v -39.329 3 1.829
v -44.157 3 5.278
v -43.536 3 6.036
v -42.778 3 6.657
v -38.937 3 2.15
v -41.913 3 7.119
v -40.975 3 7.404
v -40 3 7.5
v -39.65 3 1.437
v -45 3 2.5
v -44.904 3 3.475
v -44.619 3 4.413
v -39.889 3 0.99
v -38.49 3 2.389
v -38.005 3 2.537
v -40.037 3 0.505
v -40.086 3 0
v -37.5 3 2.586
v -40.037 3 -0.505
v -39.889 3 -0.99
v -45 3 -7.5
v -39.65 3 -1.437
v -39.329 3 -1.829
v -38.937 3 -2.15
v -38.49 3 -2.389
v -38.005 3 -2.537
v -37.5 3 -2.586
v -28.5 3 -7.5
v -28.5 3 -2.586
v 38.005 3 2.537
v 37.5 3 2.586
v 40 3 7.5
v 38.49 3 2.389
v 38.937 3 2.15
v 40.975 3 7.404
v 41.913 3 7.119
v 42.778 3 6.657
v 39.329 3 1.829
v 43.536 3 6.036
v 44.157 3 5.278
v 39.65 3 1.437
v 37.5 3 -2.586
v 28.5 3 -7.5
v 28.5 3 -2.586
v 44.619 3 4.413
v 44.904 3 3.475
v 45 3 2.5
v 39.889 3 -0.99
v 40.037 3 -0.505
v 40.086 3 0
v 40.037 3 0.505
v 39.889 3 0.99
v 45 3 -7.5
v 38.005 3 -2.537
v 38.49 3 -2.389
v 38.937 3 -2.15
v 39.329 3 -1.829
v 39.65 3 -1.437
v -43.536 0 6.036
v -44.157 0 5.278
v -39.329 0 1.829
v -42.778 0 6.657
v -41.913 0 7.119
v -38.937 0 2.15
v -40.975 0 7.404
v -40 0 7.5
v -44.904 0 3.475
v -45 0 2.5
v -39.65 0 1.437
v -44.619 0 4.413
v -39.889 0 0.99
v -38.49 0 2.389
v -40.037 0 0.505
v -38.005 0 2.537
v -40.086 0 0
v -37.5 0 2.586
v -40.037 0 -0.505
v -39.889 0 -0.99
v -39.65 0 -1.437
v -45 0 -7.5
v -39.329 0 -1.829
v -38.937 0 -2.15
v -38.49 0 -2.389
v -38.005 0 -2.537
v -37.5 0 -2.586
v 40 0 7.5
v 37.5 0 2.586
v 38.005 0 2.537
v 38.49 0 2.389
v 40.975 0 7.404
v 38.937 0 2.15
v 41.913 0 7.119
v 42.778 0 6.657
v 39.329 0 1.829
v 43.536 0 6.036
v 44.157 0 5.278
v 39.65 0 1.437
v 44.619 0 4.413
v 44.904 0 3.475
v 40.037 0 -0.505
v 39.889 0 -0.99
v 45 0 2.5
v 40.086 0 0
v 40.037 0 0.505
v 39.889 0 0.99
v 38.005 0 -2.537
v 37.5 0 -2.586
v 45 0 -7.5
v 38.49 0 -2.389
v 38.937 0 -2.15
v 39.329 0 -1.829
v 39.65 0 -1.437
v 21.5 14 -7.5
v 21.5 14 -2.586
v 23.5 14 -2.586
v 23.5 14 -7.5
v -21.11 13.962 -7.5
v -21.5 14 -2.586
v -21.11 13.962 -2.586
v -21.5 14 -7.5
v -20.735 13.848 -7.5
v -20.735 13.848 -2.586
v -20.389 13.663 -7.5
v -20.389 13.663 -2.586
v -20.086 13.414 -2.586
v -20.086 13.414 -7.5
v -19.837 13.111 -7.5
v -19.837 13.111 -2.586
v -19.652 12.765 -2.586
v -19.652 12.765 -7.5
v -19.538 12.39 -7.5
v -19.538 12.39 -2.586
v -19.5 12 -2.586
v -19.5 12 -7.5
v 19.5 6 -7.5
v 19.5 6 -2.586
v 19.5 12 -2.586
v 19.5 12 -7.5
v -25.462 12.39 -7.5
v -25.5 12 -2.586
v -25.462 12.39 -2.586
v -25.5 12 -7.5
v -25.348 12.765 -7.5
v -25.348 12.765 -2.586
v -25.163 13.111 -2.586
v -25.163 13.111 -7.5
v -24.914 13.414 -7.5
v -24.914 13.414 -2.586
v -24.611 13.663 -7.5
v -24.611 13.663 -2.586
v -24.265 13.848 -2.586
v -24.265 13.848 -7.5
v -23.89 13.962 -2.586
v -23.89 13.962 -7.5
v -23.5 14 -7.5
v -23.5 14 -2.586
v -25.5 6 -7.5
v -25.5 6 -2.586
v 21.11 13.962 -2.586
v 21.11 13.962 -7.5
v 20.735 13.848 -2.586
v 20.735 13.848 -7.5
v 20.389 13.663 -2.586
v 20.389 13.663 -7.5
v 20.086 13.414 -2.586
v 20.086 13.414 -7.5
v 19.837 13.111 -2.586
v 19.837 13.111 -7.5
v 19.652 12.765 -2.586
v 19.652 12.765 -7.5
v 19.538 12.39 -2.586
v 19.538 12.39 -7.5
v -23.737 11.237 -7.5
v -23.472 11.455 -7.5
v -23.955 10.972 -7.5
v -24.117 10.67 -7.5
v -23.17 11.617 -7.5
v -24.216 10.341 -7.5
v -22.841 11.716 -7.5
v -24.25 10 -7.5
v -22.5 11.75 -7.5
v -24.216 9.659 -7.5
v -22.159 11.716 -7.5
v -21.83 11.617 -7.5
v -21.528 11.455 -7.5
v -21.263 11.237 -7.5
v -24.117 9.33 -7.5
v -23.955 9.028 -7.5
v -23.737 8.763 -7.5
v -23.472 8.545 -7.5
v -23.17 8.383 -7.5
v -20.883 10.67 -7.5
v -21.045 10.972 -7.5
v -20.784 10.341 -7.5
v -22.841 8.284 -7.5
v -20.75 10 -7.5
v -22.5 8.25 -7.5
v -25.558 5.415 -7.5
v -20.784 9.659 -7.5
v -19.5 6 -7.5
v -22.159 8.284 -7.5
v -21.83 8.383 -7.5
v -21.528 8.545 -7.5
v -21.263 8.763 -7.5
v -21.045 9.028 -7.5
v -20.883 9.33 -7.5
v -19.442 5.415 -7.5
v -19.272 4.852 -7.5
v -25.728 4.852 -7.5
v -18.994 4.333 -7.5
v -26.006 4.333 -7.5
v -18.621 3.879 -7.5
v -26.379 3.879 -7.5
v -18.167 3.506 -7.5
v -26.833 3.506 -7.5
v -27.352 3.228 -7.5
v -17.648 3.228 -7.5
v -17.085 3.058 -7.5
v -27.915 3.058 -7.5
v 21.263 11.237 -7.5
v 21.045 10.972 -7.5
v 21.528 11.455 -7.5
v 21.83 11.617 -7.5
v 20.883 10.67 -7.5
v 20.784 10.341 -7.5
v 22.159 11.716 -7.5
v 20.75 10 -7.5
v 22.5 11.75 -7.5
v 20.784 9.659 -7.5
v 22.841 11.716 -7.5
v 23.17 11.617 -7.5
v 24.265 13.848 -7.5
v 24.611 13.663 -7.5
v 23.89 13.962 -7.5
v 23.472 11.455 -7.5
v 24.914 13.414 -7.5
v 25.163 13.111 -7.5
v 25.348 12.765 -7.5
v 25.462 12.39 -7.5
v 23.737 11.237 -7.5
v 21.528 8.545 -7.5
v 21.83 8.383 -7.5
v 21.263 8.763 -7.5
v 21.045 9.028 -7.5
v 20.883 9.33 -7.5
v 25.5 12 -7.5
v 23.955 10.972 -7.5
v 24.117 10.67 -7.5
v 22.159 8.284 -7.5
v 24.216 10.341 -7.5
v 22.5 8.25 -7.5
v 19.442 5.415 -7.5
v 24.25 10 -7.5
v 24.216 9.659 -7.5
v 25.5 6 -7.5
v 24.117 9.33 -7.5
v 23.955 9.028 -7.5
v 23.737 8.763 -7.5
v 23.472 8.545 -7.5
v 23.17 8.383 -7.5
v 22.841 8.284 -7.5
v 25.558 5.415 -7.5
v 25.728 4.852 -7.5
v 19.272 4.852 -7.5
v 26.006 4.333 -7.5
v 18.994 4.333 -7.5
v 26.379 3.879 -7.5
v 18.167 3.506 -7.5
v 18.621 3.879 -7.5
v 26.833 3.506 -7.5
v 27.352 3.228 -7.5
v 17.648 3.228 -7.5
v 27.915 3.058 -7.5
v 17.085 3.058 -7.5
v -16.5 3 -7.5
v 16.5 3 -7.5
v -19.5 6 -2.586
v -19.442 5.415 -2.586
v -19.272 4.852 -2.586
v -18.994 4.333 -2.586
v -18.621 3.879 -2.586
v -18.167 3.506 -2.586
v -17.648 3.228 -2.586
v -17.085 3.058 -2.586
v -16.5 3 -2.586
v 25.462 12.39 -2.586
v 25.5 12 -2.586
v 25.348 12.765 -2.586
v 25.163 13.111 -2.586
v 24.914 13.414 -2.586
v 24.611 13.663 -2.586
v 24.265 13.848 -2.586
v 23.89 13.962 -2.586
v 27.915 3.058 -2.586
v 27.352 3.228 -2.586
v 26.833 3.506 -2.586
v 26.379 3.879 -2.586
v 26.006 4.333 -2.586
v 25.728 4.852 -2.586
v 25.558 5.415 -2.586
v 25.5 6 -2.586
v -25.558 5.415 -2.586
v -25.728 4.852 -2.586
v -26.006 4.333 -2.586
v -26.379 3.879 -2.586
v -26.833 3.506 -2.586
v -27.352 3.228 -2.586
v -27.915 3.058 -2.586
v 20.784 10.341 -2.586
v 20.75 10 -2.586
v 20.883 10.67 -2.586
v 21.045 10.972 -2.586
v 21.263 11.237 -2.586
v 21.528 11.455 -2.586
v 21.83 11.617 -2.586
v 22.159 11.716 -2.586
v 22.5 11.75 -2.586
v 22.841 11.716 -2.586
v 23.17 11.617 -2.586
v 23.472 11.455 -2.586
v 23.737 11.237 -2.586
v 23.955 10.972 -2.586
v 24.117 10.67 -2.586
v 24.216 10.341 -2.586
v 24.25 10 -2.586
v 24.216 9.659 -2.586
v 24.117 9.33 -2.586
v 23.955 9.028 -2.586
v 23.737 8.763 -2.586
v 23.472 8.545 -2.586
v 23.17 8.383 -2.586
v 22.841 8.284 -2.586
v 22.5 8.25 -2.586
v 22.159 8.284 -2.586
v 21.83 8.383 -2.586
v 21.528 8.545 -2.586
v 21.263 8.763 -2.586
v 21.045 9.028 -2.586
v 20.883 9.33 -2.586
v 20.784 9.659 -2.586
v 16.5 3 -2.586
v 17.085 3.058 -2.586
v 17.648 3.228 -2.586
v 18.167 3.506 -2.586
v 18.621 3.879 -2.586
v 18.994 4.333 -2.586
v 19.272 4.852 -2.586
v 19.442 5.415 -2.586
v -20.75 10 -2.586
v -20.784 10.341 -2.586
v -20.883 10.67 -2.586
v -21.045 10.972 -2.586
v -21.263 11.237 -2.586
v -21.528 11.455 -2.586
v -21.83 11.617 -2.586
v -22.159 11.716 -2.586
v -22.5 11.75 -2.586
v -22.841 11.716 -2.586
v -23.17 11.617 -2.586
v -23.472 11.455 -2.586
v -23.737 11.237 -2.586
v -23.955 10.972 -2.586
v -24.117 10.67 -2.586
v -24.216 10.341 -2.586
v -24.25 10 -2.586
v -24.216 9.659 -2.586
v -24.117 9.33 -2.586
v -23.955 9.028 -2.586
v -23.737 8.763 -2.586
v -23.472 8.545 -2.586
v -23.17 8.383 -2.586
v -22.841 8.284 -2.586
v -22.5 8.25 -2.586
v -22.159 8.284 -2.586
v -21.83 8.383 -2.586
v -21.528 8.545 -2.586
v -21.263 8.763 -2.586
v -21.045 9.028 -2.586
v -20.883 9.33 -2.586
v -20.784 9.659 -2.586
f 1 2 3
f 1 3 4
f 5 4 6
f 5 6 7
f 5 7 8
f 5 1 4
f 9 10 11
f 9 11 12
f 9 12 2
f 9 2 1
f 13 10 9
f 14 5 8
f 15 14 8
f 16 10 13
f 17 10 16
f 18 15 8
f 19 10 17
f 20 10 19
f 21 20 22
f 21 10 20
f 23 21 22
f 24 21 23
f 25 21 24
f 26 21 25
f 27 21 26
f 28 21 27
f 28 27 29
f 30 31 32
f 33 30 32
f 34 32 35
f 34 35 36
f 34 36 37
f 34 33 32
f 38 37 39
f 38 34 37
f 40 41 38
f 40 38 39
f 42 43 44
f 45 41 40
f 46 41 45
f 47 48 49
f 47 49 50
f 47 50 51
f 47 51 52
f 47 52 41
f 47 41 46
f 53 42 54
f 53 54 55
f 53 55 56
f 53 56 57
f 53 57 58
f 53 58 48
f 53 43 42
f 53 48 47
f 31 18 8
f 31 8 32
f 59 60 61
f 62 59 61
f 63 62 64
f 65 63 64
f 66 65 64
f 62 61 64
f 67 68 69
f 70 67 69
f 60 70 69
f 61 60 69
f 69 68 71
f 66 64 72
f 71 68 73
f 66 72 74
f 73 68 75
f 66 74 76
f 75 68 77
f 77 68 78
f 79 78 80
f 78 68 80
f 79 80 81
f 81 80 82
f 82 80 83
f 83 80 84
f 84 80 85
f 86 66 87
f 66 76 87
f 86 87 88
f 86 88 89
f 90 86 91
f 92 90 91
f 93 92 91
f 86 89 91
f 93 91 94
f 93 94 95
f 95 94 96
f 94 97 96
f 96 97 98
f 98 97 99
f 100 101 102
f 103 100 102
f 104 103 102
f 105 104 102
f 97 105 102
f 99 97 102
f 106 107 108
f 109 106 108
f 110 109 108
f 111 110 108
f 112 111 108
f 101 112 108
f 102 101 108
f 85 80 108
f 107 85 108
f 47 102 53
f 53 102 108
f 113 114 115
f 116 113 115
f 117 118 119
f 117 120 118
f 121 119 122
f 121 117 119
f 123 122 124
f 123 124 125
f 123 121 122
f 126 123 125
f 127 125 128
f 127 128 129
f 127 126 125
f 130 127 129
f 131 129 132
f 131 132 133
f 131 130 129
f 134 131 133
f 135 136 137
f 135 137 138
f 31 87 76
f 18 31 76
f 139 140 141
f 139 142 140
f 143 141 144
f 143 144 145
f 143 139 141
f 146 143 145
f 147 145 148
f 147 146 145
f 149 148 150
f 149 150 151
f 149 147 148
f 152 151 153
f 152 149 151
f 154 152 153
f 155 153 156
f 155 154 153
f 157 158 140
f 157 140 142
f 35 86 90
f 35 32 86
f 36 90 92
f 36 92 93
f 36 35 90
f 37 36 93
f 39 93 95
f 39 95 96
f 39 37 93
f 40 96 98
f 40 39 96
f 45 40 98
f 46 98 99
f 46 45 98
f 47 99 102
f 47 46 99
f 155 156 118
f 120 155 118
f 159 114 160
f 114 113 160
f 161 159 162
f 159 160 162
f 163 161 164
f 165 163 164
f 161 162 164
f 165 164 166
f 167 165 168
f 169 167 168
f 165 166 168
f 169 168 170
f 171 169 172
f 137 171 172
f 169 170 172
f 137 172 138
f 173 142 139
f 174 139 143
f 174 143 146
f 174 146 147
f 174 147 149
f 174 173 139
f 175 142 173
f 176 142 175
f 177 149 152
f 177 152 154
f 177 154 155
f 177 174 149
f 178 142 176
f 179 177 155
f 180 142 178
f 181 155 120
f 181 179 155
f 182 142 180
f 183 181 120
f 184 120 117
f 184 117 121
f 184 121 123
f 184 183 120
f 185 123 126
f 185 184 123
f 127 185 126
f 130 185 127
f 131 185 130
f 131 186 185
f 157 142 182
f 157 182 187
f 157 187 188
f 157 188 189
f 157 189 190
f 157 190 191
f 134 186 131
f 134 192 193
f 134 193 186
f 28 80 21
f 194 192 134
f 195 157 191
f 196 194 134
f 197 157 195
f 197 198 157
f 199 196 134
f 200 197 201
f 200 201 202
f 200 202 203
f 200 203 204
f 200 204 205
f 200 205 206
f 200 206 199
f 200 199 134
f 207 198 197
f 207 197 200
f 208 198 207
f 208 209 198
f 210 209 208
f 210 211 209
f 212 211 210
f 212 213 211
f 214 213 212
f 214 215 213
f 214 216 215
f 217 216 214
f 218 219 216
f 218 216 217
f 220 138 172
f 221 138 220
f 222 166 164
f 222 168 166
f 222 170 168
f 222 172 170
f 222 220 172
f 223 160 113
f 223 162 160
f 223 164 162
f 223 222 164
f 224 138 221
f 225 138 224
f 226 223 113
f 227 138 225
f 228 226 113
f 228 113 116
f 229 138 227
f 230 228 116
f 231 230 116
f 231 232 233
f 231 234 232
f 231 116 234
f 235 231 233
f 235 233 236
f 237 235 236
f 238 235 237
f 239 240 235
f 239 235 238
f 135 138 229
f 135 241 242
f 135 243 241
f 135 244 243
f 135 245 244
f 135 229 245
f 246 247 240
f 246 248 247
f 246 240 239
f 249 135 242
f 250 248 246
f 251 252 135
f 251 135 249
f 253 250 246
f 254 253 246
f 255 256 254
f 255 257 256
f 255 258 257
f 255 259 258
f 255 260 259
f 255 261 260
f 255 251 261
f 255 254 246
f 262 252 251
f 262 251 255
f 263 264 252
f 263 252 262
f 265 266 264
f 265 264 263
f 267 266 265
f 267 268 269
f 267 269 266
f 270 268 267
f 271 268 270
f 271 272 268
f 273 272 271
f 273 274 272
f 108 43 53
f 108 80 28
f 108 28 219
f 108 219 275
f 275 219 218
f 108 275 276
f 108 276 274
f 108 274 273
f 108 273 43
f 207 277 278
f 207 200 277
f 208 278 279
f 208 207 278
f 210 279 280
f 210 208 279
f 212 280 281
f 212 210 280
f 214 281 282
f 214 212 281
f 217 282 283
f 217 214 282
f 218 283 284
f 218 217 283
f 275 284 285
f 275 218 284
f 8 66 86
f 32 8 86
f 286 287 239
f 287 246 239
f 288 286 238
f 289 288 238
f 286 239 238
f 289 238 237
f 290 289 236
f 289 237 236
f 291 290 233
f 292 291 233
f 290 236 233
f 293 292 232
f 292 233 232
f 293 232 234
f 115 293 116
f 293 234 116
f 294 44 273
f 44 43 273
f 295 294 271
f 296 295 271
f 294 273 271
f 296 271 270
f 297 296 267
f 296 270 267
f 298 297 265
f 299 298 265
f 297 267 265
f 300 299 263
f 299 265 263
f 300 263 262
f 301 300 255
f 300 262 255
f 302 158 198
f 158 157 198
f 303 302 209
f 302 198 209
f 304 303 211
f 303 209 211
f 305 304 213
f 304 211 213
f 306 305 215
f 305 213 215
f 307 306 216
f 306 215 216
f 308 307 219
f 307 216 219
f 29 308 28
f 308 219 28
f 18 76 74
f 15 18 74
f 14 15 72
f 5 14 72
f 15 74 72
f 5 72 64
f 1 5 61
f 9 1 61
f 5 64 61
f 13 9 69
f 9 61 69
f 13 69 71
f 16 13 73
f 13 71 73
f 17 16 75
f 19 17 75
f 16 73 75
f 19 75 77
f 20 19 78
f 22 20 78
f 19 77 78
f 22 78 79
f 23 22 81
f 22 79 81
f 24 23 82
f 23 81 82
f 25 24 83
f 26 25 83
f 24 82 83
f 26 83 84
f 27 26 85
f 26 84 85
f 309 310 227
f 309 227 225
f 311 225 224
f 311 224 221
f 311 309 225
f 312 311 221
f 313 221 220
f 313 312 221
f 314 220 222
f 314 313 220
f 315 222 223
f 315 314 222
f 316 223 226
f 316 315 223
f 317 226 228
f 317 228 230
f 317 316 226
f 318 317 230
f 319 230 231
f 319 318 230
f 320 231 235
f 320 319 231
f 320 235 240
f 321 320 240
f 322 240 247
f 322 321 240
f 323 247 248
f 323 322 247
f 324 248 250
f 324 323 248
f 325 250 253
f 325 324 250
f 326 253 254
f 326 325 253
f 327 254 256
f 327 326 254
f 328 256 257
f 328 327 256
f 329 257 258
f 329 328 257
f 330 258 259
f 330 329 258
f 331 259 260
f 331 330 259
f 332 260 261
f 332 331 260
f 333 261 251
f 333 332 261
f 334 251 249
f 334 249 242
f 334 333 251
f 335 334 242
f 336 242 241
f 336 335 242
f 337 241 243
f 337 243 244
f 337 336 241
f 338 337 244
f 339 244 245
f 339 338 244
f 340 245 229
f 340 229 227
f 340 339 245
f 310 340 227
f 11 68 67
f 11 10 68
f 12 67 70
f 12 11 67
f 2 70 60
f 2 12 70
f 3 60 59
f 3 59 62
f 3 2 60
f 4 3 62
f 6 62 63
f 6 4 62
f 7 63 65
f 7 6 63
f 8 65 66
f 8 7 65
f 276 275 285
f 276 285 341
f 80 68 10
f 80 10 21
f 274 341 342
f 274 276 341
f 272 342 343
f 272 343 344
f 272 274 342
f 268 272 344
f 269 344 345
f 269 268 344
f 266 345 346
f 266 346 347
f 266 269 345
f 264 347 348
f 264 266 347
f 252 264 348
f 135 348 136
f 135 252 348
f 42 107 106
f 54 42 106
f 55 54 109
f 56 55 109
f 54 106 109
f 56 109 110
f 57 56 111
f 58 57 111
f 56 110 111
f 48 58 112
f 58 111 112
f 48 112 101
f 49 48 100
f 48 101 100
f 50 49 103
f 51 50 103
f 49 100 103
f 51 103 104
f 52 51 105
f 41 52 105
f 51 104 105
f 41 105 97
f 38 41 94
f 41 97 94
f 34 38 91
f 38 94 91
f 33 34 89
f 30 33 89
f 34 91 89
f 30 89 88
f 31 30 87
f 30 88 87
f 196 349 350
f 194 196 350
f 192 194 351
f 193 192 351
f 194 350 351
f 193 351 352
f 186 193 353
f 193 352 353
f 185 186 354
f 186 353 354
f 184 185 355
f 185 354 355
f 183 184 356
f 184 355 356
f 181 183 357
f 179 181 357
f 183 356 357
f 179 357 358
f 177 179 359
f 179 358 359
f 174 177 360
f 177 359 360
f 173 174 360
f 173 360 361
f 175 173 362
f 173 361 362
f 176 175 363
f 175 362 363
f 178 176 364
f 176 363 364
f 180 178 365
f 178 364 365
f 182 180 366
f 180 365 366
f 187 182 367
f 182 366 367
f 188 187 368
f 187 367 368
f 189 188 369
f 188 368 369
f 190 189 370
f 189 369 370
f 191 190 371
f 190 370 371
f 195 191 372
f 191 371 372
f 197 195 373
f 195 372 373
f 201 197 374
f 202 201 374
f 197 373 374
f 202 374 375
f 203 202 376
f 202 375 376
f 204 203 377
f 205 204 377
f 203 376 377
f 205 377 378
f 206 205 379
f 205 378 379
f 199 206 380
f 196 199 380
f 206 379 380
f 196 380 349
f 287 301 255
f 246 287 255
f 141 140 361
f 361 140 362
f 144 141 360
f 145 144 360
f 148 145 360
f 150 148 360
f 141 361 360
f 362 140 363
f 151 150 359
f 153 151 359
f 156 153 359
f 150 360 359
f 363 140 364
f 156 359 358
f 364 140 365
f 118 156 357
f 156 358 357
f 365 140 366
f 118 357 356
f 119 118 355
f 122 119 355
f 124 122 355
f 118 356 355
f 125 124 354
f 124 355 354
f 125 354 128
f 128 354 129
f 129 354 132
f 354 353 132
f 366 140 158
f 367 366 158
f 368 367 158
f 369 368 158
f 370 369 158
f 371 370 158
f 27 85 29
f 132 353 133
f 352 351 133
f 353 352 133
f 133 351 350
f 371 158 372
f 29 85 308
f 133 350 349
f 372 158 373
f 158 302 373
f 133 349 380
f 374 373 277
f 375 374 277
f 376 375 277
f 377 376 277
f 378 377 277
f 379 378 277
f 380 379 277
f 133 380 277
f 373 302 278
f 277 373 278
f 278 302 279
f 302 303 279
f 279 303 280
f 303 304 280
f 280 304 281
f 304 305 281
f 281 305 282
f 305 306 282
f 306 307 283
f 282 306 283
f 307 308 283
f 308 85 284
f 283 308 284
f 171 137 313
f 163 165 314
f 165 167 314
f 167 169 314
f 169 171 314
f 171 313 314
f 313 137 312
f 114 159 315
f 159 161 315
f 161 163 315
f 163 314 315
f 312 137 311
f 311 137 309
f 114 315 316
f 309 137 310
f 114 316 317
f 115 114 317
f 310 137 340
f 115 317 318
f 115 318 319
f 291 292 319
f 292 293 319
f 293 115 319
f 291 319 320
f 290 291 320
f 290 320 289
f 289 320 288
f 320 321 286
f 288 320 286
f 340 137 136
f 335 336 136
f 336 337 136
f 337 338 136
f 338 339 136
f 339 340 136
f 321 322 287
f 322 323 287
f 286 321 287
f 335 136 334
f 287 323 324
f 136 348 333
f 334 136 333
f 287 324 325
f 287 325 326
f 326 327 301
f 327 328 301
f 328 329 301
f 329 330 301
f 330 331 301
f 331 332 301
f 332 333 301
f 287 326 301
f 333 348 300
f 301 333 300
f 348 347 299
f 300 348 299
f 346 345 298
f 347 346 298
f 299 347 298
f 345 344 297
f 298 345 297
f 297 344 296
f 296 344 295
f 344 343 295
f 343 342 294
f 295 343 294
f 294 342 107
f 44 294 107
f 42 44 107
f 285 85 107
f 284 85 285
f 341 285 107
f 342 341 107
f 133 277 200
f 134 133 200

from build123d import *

# Parameters (mm, degrees)
SKETCH1_W           = 90
SKETCH1_H           = 15
BOSS_EXTRUDE1_DEPTH = 3
FILLET1_R           = 5
SKETCH2_W           = 6
SKETCH2_H           = 4.913709841
BOSS_EXTRUDE2_DEPTH = 11
SKETCH3_R           = 1.75
CUT_EXTRUDE1_DEPTH  = 4.913709841
FILLET2_R           = 2
FILLET3_R           = 3


with BuildPart() as part:
    # Sketch1 → Boss-Extrude1 (new body)
    with BuildSketch(Plane(origin=(0, 0, 0), x_dir=(1, 0, 0), z_dir=(0, 1, 0))):
        Rectangle(SKETCH1_W, SKETCH1_H)
        with BuildLine():
            Line((-37.5, 2.586290159), (37.5, 2.586290159))
            ThreePointArc((37.5, 2.586290159), (40.086290159, 0), (37.5, -2.586290159))
            Line((37.5, -2.586290159), (-37.5, -2.586290159))
            ThreePointArc((-37.5, -2.586290159), (-40.086290159, 0), (-37.5, 2.586290159))
        make_face(mode=Mode.SUBTRACT)
    extrude(amount=BOSS_EXTRUDE1_DEPTH)

    # Fillet1
    fillet1_edges = [part.edges().sort_by_distance(p)[0] for p in [
        (45, 1.5, 7.5),
        (-45, 1.5, 7.5),
    ]]
    fillet(fillet1_edges, radius=FILLET1_R)

    # Sketch2 → Boss-Extrude2 (add)
    with BuildSketch(Plane(origin=(0, 3, 0), x_dir=(1, 0, 0), z_dir=(0, 1, 0))):
        with Locations((-22.5, 5.04314508)):
            Rectangle(SKETCH2_W, SKETCH2_H)
        with Locations((22.5, 5.04314508)):
            Rectangle(SKETCH2_W, SKETCH2_H)
    extrude(amount=BOSS_EXTRUDE2_DEPTH)

    # Sketch3 → Cut-Extrude1 (cut)
    with BuildSketch(Plane.XY.offset(-2.586290159)):
        with Locations((-22.5, 10)):
            Circle(SKETCH3_R)
    cut_extrude1 = extrude(amount=-CUT_EXTRUDE1_DEPTH, mode=Mode.SUBTRACT)

    # Mirror1: Cut-Extrude1 across plane
    add(cut_extrude1.mirror(Plane(origin=(0, 0, 0), x_dir=(0, 0, 1), z_dir=(1, 0, 0))), mode=Mode.SUBTRACT)

    # Fillet2
    fillet2_edges = [part.edges().sort_by_distance(p)[0] for p in [
        (-25.5, 14, -5.043145079),
        (-19.5, 14, -5.043145079),
        (19.5, 14, -5.043145079),
        (25.5, 14, -5.043145079),
    ]]
    fillet(fillet2_edges, radius=FILLET2_R)

    # Fillet3
    fillet3_edges = [part.edges().sort_by_distance(p)[0] for p in [
        (-25.5, 3, -5.043145079),
        (-19.5, 3, -5.043145079),
        (19.5, 3, -5.043145079),
        (25.5, 3, -5.043145079),
    ]]
    fillet(fillet3_edges, radius=FILLET3_R)


solid = part.part
